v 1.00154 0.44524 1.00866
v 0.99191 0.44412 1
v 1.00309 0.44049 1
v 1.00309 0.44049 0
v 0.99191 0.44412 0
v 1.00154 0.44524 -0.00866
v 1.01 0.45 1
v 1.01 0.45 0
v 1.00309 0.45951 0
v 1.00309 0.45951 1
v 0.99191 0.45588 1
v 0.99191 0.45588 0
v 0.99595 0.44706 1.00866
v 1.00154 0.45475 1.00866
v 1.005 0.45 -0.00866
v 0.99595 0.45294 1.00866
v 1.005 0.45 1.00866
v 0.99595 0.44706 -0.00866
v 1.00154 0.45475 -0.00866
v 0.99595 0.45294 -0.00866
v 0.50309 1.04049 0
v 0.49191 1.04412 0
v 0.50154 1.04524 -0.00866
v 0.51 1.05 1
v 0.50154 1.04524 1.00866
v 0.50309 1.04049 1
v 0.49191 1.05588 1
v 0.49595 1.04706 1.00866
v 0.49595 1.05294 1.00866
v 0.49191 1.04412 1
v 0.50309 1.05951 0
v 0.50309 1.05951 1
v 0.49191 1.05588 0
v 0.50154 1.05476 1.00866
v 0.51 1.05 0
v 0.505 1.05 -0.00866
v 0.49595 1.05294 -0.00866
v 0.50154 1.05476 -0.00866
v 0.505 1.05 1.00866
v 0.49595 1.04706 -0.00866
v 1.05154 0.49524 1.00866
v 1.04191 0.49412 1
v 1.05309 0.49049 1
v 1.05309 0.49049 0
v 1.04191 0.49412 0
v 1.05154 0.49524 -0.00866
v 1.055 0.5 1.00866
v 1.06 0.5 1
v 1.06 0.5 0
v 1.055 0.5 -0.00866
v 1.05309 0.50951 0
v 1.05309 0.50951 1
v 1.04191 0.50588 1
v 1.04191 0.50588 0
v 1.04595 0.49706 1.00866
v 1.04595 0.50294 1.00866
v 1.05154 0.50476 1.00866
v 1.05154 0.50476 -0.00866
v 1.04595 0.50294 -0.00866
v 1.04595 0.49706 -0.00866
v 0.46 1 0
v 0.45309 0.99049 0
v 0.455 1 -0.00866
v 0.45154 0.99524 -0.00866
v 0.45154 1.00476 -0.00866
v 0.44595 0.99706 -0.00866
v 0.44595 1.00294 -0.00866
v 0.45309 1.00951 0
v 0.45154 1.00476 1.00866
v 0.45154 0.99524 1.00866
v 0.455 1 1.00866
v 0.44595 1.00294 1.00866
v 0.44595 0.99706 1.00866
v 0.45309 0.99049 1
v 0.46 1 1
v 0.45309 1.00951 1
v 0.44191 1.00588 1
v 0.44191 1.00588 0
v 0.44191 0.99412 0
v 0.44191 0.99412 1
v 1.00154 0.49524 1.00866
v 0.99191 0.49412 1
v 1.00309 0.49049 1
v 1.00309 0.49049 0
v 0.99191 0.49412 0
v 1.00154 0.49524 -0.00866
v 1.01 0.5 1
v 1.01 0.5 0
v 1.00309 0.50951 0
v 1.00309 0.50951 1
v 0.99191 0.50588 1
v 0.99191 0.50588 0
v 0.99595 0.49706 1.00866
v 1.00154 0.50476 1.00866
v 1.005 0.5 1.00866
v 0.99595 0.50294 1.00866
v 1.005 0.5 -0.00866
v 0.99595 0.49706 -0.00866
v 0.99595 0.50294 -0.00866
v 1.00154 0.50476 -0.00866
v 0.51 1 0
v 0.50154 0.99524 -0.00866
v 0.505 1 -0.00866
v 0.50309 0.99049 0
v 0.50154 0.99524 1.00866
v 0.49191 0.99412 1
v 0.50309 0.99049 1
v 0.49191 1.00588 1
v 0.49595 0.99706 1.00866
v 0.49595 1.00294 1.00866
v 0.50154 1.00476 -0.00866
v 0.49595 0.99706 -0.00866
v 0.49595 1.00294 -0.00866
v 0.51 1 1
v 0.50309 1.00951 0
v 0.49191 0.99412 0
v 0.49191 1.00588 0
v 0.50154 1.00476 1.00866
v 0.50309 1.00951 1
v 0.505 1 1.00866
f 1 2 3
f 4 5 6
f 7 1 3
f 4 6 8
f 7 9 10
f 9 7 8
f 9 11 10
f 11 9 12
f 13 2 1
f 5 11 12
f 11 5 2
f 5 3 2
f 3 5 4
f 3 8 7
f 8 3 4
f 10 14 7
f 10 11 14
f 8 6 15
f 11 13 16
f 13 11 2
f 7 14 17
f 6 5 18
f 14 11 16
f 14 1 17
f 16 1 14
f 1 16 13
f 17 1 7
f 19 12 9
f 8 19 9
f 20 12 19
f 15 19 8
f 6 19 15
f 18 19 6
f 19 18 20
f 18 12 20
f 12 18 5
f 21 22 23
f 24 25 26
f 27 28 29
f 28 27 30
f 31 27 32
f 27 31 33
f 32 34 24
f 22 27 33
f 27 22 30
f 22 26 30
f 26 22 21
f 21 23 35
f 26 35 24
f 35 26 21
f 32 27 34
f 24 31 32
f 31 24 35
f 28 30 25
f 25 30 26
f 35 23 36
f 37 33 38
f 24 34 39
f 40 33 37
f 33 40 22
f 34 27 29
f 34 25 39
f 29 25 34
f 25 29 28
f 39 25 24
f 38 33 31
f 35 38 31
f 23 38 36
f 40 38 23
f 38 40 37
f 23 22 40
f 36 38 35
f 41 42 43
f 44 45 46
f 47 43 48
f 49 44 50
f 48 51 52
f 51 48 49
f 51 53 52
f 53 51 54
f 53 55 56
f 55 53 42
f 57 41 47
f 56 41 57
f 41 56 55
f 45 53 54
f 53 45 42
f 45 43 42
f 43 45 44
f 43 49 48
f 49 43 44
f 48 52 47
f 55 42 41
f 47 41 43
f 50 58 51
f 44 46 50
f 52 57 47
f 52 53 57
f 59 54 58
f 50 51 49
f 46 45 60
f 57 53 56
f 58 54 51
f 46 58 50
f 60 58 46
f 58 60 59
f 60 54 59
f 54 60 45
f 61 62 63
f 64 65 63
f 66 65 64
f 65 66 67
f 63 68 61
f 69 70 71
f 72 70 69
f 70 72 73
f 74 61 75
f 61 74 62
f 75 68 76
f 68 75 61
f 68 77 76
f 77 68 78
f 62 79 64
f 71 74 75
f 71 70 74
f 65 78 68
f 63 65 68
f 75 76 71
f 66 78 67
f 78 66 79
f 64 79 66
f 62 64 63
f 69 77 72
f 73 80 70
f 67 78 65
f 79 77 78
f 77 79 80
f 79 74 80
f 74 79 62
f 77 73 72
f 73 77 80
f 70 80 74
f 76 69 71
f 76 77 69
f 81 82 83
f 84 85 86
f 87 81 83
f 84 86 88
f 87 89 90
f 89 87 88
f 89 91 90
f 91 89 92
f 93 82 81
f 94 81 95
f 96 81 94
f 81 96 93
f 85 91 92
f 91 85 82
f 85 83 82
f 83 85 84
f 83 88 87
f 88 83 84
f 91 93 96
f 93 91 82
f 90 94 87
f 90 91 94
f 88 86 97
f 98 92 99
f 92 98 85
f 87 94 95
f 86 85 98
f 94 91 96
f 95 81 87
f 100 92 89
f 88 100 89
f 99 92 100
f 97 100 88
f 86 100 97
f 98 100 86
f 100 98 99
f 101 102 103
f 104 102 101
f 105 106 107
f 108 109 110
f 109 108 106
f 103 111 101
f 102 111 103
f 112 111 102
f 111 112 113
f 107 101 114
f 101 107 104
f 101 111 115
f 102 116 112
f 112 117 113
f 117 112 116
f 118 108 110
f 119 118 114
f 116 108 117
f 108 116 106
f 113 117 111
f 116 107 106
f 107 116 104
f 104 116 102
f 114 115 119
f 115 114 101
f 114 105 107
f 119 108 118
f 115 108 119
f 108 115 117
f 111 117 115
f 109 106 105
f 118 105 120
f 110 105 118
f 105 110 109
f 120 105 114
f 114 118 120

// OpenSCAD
 

% union(){
cube(1);
// cube (1,center=true  );
translate([.5,.5])cube (1  );
    }
 %intersection(){
cube(1);
// cube (1,center=true  );
////translate([.5,.5])cube (1  );
}


//color("red")polyline([[.5,0,.5],[0,0,.5],[0,.5,.5],[0,.5,0],[0.5,.5,0],[0.5,0,0],[0.5,0,0.5],],.01);
//color("lightgreen",.5)polyline([[.55,0,.55],[0,0,.55],[0,.55,.55],[0,.55,0],[0.55,.55,0],[0.55,0,0],[0.55,0,0.55],],.005);
//color("lightblue",.5)polyline([[.5,-.05,.5],[-.05,-.05,.5],[-.05,.5,.5],[-.05,.5,-.05],[0.5,.5,-.05],[0.5,-.05,-.05],[0.5,-.05,0.5],],.005);
{ color("red")polyline([[1,0.5,0],[1,.5,1] ],.01);
 color("red")polyline([[.5,1,0],[.5,1,1] ],.01);}
 
 color("lightgreen",.5){ 
     polyline([[1,0.45,0],[1,.45,1] ],.01);
 polyline([[.5,1.05,0],[.5,1.05,1] ],.01);}
 
color("lightblue",.5) {
    polyline([[1.05,0.5,0],[1.05,.5,1] ],.01);

polyline([[.5-.05,1,0],[.5-.05,1,1] ],.01);}

 module polyline(p,w) {for(i=[0:max(0,len(p)-2)])line(p[i],p[(i+1)%len(p)  ],w);
} // polyline plotter
module line(p1, p2 ,width=0.5) 
{ // single line plotter
    hull() {
        translate(p1) sphere(width);
        translate(p2) sphere(width);
    }
}
